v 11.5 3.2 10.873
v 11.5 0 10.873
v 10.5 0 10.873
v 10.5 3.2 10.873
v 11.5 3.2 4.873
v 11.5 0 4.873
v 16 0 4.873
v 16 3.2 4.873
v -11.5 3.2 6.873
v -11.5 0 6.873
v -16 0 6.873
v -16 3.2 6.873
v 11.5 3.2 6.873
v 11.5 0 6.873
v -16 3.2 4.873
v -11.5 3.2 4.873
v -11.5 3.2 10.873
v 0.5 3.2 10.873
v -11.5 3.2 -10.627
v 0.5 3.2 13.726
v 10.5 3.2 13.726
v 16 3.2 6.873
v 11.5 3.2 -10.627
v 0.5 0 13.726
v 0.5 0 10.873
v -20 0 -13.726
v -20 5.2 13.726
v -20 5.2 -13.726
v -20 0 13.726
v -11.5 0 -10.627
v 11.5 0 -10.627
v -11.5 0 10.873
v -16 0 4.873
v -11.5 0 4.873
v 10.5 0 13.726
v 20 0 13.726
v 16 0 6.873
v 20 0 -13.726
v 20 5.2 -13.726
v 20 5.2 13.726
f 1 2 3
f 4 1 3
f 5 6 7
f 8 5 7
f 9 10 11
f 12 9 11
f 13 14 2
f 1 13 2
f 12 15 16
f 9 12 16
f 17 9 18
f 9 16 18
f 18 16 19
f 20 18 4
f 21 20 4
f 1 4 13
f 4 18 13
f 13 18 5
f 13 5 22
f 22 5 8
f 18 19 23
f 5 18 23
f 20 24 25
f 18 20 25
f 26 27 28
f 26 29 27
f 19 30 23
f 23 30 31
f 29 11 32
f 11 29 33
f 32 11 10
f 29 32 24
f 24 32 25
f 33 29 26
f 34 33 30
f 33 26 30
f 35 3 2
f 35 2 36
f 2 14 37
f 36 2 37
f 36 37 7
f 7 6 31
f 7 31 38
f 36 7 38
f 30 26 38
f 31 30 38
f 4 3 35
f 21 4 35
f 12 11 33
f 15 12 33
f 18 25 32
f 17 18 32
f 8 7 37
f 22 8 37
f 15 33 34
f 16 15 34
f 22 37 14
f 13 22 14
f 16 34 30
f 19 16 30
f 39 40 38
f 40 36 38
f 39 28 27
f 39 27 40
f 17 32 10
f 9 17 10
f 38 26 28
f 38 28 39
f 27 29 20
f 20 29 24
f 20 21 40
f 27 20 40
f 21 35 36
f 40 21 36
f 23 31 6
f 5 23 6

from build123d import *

# Parameters (mm, degrees)
BOSS_EXTRUDE1_DEPTH = 3.2
SKETCH2_W           = 40
SKETCH2_H           = 27.451745852
BOSS_EXTRUDE2_DEPTH = 2


with BuildPart() as part:
    # Sketch1 → Boss-Extrude1 (new body)
    with BuildSketch(Plane(origin=(0, 0, 0), x_dir=(1, 0, 0), z_dir=(0, 1, 0))):
        Polygon((10.5, -10.873040155), (10.5, -13.725872926), (20, -13.725872926), (20, 13.725872926), (-20, 13.725872926), (-20, -13.725872926), (0.5, -13.725872926), (0.5, -10.873040155), (-11.5, -10.873040155), (-11.5, -6.873040155), (-16, -6.873040155), (-16, -4.873040155), (-11.5, -4.873040155), (-11.5, 10.626959845), (11.5, 10.626959845), (11.5, -4.873040155), (16, -4.873040155), (16, -6.873040155), (11.5, -6.873040155), (11.5, -10.873040155), align=None)
    extrude(amount=BOSS_EXTRUDE1_DEPTH)

    # Sketch2 → Boss-Extrude2 (add)
    with BuildSketch(Plane(origin=(0, 3.2, 0), x_dir=(1, 0, 0), z_dir=(0, 1, 0))):
        Rectangle(SKETCH2_W, SKETCH2_H)
    extrude(amount=BOSS_EXTRUDE2_DEPTH)


solid = part.part
